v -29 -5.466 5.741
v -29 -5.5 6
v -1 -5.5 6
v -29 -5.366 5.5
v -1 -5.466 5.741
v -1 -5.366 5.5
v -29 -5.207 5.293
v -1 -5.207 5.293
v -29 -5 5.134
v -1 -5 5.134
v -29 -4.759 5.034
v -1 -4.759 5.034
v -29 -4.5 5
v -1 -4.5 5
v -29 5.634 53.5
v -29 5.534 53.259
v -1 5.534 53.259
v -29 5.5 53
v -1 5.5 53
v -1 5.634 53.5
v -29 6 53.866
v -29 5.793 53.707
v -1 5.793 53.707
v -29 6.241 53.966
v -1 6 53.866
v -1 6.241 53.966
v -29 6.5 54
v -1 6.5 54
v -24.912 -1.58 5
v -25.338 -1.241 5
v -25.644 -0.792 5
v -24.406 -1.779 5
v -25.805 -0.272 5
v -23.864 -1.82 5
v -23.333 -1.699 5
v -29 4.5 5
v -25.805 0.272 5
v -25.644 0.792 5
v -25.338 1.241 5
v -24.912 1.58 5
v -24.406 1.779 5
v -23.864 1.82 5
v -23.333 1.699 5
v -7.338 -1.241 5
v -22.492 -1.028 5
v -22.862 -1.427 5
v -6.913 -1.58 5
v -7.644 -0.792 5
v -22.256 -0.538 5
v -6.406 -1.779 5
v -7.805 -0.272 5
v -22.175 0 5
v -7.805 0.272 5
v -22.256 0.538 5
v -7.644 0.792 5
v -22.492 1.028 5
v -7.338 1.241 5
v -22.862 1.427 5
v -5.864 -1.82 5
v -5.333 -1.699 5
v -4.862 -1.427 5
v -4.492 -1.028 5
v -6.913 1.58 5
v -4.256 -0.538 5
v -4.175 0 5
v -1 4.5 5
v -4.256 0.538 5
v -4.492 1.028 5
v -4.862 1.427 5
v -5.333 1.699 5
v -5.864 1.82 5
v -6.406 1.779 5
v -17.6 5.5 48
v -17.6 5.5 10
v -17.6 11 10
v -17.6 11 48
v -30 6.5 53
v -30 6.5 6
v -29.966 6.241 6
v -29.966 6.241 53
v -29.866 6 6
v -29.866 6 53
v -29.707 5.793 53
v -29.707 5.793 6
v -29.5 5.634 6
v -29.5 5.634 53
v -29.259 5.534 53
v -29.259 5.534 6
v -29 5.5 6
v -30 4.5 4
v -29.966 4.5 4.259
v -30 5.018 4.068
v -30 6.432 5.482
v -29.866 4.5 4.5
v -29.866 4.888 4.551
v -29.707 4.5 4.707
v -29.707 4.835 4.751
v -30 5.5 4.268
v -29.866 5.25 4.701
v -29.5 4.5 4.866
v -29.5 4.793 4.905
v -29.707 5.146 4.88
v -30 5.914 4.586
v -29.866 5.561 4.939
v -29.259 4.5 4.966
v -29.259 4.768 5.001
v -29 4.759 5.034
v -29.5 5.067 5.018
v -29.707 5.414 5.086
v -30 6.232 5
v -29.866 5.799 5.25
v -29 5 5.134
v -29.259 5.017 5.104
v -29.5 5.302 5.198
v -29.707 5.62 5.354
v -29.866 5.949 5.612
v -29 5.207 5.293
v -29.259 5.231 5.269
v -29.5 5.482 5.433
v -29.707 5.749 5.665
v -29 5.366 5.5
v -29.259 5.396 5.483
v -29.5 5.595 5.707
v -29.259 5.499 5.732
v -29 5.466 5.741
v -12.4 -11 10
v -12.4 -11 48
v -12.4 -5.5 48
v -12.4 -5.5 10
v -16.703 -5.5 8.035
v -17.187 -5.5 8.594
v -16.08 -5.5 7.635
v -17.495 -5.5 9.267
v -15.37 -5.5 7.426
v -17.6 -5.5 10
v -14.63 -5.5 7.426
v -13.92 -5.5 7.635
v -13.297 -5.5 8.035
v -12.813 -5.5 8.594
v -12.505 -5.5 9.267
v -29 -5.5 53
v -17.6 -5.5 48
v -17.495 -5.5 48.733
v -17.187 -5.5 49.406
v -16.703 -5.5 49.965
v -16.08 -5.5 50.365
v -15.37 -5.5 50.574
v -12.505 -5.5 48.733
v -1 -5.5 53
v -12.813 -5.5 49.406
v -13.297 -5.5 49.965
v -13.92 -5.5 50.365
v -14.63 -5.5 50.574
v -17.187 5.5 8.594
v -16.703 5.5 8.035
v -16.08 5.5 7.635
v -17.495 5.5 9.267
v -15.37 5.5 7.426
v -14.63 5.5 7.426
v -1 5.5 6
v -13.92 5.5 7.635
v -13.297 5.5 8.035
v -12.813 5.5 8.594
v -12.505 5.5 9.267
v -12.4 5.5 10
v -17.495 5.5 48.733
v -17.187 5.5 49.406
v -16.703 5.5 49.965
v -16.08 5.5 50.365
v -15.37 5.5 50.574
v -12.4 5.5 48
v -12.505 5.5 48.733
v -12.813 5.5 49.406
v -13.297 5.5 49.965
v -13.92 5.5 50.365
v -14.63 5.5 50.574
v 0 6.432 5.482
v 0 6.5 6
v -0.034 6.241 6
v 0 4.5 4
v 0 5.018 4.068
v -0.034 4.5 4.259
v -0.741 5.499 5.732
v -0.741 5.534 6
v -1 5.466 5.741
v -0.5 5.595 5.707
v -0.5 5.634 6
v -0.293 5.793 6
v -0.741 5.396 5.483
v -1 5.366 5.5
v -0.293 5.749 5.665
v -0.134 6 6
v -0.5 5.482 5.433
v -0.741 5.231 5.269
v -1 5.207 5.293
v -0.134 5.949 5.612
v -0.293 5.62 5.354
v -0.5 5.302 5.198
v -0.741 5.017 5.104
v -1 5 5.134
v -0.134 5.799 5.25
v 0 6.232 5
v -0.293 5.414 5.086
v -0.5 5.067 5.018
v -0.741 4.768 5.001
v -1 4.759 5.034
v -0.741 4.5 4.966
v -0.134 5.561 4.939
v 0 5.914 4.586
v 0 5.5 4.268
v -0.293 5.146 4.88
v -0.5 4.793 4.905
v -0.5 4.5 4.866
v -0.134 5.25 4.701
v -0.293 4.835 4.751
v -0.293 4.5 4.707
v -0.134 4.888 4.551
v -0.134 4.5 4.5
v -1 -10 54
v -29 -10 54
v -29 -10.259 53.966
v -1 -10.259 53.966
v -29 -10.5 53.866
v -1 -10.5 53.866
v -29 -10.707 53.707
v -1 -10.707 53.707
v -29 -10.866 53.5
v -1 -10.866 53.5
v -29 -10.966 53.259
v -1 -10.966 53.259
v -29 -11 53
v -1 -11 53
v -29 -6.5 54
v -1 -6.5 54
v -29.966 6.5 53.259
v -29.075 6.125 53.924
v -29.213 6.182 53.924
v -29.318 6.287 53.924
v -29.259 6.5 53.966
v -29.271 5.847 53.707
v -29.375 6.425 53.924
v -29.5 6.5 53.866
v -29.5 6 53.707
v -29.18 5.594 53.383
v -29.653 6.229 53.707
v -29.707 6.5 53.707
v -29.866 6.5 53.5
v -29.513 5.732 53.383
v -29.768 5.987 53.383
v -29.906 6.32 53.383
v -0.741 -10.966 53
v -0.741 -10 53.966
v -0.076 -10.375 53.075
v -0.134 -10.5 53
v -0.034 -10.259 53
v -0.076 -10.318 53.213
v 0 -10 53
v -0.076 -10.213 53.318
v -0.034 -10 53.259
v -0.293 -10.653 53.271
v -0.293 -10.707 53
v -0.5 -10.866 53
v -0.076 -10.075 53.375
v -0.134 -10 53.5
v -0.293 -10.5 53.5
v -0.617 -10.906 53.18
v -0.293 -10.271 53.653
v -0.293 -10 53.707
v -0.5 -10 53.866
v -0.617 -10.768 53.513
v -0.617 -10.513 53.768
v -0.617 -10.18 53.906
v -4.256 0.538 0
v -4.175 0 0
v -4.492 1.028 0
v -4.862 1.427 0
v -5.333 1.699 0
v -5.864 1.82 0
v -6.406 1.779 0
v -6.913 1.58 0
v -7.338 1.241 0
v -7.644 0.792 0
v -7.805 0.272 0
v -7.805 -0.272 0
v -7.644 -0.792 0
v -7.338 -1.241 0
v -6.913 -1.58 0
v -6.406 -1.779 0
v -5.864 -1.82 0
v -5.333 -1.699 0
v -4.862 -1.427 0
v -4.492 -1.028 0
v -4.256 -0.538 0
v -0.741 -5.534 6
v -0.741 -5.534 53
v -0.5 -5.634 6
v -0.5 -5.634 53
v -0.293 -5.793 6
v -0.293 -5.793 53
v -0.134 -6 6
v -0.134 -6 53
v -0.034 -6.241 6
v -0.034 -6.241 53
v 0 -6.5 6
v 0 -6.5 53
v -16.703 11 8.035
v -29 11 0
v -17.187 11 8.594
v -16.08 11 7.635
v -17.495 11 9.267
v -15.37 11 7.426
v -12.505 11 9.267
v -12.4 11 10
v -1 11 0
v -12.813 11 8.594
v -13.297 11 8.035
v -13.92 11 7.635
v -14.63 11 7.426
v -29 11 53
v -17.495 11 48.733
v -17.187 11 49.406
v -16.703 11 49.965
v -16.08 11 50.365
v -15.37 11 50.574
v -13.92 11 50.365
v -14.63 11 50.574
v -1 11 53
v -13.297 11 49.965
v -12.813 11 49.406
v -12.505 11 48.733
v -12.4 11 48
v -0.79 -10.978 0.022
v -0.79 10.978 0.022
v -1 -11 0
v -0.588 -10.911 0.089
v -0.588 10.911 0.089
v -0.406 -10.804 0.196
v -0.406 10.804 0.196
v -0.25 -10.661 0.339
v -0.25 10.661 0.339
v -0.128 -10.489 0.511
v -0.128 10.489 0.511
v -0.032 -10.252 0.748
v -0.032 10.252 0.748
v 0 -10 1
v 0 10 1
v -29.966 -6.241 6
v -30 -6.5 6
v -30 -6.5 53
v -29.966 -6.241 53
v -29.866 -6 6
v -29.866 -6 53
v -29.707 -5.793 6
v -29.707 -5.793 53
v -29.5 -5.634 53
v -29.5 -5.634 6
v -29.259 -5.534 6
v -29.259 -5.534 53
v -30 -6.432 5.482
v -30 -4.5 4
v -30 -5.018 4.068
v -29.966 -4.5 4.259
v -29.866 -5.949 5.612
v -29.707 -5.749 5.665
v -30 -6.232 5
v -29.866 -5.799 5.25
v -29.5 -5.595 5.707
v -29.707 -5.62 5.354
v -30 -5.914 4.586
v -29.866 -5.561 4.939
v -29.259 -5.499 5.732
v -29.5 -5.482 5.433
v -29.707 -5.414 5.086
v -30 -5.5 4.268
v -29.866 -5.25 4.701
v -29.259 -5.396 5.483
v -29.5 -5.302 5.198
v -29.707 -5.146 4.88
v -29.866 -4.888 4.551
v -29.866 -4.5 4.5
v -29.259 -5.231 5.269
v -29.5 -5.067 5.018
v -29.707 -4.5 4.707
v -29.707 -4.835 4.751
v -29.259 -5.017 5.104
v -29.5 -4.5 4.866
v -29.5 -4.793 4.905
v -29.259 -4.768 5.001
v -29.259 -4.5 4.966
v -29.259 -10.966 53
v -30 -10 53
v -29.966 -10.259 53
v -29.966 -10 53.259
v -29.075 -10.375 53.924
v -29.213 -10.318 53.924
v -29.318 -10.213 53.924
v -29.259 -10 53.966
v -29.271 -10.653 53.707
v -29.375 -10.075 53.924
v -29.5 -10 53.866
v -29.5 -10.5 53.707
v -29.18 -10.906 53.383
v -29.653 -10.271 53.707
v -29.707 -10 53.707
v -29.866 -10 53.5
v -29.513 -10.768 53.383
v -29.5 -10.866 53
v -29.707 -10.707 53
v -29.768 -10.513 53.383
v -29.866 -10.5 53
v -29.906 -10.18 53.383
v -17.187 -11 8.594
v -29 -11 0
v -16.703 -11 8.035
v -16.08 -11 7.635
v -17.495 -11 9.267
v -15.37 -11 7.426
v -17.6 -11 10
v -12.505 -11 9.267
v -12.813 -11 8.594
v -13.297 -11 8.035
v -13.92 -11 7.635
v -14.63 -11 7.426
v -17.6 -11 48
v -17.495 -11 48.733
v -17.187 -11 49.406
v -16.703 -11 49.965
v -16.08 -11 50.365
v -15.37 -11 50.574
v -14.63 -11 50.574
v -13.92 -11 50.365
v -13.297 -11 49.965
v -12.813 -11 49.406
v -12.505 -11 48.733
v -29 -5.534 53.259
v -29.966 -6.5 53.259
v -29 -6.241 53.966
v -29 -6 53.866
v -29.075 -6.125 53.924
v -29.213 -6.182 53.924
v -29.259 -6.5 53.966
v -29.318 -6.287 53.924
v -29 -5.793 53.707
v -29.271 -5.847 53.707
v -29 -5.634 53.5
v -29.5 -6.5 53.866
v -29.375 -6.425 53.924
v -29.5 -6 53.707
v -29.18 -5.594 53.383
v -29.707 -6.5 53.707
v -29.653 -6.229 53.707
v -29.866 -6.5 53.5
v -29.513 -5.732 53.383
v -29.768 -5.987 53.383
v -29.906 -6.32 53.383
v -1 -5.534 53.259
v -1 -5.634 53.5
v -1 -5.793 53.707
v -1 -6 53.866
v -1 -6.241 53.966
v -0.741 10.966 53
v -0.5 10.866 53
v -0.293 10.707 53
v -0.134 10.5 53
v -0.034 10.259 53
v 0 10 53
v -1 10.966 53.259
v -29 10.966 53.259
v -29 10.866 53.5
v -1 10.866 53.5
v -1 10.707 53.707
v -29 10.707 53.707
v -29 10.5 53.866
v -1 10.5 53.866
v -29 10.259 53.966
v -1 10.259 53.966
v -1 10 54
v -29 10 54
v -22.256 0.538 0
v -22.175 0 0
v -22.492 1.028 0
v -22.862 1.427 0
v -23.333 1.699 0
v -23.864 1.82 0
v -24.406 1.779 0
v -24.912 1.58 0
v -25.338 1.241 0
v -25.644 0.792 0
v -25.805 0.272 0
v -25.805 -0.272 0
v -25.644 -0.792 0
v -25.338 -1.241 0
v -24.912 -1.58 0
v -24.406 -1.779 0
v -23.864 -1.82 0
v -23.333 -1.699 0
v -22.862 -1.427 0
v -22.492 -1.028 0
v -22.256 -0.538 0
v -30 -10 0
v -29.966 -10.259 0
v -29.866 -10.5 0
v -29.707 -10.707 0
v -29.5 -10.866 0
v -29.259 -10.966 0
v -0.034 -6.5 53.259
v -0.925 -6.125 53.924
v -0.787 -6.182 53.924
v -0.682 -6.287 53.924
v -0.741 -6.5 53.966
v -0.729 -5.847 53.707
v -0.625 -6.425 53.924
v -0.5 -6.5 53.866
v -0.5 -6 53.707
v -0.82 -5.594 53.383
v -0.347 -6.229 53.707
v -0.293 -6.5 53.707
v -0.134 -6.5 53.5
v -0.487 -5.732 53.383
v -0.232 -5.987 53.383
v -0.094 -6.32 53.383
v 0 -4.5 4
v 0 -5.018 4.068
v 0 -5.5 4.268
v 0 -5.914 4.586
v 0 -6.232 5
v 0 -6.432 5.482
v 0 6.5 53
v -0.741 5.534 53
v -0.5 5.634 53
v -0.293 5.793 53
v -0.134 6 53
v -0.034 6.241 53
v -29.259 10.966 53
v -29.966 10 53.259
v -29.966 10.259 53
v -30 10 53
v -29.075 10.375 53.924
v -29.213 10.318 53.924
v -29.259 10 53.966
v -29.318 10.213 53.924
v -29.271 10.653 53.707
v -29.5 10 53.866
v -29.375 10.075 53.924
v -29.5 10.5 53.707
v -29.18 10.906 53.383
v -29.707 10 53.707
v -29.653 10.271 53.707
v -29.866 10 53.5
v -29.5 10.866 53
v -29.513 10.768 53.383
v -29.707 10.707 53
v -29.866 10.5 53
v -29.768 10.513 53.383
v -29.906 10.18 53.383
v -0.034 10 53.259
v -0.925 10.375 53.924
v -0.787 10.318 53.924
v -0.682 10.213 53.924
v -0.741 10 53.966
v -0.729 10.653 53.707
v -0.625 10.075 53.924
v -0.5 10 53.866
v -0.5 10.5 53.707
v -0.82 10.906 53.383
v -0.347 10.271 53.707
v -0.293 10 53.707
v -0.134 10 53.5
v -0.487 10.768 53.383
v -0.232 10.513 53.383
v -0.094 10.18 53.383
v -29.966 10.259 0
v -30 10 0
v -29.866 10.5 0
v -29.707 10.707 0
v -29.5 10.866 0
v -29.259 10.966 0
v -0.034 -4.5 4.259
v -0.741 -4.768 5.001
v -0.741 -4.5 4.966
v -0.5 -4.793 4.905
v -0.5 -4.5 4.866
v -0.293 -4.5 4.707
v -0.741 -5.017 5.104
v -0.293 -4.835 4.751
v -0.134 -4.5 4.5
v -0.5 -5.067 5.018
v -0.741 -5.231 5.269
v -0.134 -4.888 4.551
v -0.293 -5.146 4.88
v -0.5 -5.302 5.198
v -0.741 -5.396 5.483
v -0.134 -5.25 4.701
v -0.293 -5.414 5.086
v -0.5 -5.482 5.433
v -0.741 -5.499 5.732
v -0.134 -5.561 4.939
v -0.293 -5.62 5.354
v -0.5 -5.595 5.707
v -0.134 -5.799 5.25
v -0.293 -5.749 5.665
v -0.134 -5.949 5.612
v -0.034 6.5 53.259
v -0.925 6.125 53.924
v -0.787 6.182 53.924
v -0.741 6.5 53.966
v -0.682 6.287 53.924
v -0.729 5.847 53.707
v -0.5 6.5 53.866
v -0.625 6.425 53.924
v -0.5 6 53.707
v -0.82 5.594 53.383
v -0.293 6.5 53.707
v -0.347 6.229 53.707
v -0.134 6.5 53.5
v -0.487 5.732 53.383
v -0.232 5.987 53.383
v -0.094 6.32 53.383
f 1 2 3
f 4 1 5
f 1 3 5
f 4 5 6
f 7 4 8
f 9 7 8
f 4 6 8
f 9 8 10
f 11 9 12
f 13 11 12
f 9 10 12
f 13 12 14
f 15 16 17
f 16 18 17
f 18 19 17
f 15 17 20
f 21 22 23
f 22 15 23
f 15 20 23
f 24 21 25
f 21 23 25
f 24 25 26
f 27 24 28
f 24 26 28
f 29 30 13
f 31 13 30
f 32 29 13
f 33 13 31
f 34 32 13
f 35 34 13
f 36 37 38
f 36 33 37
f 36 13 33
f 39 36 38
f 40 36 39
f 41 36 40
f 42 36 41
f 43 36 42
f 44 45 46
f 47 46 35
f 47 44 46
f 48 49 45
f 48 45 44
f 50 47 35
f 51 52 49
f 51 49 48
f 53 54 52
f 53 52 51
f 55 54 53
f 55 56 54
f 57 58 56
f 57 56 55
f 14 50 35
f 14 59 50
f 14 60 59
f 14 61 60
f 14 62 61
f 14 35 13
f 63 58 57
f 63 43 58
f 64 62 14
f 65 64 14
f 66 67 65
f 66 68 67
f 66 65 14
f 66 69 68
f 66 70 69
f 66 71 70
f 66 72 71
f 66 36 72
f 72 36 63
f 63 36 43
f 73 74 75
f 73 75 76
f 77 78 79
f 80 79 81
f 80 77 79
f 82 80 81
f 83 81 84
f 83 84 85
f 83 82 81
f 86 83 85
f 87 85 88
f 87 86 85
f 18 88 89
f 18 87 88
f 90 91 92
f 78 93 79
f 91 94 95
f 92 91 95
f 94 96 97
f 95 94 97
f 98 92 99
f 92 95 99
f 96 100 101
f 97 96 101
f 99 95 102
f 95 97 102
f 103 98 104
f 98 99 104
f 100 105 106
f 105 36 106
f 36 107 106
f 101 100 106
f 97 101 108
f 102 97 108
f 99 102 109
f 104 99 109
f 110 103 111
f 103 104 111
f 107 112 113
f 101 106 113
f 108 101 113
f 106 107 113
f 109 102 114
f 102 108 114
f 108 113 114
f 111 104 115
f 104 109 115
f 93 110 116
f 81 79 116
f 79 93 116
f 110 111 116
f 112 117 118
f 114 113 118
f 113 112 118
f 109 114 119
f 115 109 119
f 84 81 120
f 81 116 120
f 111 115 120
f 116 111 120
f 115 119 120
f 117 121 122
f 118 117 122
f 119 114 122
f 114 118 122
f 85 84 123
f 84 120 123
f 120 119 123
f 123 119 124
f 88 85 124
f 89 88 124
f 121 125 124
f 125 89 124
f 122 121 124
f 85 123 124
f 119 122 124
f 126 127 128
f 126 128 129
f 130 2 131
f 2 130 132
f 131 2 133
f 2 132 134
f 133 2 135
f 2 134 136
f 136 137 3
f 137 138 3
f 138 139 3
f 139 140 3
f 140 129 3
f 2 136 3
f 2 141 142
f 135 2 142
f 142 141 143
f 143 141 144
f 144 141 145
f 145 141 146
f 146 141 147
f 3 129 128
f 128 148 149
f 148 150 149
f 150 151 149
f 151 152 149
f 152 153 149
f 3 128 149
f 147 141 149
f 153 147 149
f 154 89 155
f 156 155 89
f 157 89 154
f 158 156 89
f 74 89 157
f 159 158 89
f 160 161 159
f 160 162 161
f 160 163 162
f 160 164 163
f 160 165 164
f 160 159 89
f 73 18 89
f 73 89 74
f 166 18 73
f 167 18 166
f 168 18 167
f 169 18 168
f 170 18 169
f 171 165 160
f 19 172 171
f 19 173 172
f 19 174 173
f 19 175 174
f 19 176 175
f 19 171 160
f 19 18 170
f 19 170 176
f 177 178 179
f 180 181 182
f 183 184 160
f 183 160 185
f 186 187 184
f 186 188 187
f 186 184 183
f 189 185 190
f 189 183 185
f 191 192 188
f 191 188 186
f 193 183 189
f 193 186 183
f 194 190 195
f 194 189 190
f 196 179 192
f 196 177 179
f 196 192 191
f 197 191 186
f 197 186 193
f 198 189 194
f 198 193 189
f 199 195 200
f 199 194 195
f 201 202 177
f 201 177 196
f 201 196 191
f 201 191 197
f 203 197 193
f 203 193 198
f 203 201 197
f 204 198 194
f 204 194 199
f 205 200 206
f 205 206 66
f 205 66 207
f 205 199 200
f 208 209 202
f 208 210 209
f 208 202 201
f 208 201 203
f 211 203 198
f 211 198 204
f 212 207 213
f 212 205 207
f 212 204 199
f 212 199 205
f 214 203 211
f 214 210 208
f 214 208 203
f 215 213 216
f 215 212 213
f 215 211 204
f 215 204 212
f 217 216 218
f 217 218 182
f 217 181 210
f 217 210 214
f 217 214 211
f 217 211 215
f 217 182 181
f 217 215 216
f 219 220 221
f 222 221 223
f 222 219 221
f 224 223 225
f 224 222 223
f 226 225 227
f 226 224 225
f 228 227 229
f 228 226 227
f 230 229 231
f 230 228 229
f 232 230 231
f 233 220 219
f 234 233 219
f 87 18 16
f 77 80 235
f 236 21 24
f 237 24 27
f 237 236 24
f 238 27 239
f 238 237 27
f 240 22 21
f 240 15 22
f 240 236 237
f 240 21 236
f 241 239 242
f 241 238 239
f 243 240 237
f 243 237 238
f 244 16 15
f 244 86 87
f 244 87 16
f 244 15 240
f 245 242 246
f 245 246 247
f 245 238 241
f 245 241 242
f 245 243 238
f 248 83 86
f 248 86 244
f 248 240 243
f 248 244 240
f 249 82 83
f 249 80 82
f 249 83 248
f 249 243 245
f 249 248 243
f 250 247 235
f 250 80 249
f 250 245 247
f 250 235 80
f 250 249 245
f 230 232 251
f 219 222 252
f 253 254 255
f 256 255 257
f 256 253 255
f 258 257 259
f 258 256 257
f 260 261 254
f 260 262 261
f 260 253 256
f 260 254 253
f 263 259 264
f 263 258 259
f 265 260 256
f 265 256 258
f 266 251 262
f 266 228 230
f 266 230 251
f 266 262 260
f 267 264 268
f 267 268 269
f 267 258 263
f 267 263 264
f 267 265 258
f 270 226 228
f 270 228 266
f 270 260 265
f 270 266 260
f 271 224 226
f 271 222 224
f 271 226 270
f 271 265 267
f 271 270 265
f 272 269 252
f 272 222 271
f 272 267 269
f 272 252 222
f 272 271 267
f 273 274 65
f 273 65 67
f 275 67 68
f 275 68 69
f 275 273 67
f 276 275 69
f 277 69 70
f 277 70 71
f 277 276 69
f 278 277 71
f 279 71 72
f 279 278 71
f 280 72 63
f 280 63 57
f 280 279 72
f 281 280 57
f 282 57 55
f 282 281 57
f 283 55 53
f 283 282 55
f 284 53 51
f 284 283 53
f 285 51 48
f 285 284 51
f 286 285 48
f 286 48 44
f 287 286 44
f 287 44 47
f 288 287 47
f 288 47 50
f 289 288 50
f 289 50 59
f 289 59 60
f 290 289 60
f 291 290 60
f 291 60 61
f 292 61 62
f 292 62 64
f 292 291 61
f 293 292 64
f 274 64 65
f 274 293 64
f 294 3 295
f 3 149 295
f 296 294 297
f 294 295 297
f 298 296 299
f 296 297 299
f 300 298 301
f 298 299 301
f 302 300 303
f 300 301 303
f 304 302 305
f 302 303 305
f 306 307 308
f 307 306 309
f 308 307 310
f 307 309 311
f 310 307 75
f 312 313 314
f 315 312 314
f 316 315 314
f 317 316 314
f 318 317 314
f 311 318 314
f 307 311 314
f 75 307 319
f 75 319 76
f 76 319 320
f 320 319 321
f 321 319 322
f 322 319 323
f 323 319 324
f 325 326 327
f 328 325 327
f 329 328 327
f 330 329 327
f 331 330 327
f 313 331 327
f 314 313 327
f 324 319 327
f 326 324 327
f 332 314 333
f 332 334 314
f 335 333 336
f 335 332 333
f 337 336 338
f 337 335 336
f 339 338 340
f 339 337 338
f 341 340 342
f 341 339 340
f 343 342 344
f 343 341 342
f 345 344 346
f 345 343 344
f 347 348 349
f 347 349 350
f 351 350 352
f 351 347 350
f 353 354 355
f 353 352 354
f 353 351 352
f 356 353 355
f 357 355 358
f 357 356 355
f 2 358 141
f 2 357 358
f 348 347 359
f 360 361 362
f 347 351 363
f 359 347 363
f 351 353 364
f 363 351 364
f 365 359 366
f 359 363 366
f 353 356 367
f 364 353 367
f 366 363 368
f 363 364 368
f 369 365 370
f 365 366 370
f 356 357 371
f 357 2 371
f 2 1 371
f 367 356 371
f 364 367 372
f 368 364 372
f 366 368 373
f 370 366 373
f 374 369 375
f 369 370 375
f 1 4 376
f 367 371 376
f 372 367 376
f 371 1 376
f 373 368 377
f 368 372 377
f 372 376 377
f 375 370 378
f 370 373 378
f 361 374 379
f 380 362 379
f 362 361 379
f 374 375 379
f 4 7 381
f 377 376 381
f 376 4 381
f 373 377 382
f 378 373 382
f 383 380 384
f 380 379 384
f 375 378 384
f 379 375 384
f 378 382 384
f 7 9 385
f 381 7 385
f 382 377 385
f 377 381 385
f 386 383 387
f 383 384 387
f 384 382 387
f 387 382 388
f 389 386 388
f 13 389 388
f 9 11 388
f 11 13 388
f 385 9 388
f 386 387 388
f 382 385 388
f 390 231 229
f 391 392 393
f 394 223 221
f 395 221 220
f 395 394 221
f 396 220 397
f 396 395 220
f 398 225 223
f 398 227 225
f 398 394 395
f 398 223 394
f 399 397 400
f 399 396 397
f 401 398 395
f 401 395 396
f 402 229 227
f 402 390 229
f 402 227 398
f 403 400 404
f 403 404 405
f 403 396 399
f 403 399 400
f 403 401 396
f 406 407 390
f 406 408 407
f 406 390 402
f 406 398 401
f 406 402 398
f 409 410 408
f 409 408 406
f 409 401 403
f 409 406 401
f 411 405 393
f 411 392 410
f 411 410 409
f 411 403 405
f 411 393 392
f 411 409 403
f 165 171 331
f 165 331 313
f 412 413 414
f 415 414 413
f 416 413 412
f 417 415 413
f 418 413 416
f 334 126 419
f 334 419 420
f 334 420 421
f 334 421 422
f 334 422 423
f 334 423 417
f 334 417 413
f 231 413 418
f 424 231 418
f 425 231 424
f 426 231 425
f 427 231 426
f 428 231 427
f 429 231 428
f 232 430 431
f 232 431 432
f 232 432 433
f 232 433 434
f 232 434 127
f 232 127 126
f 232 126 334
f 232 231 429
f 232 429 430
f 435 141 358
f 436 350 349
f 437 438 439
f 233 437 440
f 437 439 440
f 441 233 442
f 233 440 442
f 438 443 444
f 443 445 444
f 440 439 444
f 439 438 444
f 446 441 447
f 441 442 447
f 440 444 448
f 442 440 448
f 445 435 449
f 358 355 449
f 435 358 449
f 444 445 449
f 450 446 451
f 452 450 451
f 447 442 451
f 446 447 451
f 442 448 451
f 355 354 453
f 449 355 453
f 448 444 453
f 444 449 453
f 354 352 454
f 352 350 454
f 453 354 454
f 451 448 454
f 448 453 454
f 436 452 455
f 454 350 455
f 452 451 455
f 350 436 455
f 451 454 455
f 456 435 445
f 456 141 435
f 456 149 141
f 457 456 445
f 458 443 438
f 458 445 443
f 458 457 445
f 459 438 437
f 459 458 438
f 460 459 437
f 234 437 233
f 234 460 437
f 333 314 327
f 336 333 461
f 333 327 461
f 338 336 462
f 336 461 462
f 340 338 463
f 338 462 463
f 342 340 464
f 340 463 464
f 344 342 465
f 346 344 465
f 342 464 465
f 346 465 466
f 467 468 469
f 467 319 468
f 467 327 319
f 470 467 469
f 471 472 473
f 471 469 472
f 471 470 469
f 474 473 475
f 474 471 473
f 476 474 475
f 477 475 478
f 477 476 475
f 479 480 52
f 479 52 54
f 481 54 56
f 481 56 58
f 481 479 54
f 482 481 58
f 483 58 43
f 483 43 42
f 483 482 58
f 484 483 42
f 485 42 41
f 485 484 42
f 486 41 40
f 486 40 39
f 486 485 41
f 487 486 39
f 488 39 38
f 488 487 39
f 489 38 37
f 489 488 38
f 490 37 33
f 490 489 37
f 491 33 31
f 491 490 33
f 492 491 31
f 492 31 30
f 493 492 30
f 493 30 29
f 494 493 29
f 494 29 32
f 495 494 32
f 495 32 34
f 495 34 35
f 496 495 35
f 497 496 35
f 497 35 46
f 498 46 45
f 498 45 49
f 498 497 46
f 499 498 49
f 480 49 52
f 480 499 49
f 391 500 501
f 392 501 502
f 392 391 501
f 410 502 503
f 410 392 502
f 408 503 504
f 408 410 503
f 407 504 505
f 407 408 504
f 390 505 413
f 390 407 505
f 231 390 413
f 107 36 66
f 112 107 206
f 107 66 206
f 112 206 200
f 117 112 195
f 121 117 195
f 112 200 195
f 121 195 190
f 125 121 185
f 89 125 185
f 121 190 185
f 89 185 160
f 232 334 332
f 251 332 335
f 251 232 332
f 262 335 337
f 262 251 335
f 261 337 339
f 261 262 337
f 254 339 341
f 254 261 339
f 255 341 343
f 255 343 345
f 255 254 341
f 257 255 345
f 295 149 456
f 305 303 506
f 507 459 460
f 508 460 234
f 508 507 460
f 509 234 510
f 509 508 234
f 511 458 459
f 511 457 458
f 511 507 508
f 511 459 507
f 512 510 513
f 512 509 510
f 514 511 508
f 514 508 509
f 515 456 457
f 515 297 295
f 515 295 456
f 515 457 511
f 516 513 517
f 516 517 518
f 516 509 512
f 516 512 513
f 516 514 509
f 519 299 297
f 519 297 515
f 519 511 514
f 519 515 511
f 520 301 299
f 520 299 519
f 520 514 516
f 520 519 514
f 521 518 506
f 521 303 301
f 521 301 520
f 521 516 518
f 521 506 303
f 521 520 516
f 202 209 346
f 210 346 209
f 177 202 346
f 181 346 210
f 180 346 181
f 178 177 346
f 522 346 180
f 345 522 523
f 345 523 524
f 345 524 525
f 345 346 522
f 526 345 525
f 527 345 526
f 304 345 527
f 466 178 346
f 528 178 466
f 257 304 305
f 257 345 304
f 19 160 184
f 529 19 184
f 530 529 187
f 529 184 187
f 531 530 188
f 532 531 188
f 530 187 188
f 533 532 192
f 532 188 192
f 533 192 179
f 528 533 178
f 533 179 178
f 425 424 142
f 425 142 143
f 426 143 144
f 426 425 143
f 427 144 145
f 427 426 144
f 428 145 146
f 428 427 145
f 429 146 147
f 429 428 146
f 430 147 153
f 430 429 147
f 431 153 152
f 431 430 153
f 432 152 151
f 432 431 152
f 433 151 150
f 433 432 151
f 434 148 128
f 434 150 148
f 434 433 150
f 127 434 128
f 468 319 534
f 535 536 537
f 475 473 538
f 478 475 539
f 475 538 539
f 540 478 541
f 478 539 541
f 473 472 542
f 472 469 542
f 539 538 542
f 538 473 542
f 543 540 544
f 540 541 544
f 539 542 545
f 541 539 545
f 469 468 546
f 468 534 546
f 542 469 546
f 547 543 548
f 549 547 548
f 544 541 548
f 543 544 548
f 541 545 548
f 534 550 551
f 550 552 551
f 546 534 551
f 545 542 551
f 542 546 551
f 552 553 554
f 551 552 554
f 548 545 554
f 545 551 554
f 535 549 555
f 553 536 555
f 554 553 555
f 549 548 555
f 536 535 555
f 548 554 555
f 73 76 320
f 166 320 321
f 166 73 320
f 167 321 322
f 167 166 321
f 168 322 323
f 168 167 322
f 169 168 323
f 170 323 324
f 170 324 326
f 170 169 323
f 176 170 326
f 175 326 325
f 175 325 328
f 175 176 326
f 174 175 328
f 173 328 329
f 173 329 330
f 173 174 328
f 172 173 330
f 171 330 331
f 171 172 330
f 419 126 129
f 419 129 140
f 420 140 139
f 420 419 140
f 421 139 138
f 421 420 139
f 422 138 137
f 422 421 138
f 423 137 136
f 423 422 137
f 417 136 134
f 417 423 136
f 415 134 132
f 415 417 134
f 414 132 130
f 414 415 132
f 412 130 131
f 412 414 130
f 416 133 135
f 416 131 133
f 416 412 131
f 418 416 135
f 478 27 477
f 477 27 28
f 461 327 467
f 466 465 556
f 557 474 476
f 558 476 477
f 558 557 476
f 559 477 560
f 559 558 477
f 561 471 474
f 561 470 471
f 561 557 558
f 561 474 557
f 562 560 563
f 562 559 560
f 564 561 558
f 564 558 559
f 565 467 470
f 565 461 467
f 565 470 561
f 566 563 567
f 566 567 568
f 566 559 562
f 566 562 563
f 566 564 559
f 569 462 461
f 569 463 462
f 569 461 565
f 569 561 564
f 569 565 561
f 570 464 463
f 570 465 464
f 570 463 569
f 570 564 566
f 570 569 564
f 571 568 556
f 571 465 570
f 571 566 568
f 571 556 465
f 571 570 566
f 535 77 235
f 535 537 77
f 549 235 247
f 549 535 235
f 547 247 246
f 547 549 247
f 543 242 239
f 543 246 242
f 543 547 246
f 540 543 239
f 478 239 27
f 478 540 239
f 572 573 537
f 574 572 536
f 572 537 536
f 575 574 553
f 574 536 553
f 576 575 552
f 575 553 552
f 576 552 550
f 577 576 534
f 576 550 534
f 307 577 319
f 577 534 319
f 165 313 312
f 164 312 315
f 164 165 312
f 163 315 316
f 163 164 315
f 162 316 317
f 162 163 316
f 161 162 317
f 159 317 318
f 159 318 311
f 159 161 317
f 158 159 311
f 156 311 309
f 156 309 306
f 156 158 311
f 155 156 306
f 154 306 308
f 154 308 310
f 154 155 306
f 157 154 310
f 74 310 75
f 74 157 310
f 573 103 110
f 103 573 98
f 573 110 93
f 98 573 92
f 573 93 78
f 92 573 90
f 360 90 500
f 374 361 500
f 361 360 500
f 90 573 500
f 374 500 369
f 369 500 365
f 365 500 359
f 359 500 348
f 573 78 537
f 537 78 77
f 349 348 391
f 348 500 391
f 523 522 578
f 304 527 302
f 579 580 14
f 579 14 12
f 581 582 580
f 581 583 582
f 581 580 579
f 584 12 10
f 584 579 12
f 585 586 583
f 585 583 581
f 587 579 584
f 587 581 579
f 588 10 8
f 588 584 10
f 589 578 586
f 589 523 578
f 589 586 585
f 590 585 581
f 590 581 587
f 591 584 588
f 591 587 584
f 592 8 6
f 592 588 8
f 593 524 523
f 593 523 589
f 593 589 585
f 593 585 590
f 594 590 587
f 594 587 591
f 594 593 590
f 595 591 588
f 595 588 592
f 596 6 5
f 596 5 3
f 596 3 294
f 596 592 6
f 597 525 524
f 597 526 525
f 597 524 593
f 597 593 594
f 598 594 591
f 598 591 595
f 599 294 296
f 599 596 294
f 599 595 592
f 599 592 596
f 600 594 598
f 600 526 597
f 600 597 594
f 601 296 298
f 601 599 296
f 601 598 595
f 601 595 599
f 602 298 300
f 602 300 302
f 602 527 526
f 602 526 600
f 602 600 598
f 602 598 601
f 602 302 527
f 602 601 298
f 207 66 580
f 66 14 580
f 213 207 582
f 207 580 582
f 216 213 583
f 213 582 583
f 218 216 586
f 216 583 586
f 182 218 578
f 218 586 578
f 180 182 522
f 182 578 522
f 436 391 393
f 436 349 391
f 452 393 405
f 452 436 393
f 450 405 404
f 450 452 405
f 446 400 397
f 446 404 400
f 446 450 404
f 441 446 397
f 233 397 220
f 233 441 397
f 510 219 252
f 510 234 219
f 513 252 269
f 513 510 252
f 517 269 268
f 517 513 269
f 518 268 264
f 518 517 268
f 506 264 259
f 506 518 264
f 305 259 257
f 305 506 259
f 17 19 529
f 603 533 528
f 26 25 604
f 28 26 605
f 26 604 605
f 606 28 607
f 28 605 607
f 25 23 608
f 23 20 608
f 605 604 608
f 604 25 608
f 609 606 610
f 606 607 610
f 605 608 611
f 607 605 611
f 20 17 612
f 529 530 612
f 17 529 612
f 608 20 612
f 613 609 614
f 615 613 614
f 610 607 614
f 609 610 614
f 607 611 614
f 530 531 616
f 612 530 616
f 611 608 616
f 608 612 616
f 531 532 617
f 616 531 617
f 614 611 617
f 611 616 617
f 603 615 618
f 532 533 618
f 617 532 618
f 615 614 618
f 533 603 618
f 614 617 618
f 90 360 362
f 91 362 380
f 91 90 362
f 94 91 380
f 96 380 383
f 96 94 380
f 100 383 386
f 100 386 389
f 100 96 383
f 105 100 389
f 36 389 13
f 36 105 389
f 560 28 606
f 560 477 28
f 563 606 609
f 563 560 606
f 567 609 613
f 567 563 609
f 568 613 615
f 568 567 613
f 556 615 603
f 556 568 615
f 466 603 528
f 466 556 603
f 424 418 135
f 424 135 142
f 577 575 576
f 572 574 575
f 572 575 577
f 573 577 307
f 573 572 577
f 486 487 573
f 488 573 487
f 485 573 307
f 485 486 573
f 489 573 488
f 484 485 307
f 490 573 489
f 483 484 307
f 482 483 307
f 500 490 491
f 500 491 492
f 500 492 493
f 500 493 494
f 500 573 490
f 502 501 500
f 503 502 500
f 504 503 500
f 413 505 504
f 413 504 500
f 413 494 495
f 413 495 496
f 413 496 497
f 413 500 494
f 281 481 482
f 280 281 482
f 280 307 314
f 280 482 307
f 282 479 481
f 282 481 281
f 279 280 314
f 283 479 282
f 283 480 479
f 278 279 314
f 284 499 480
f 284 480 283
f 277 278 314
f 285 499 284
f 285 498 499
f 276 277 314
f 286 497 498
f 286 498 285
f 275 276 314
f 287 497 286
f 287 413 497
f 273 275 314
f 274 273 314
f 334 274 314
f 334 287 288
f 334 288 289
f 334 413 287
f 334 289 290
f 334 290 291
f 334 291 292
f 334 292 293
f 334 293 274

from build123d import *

# Parameters (mm, degrees)
F0_W     = 30
F0_H     = 54
F1_DEPTH = 11
F2_W     = 30
F2_H     = 11
F3_DEPTH = 49
F4_R     = 1.825
F5_DEPTH = 5
F6_F1_R  = 1
F6_F2_R  = 1


with BuildPart() as f1:
    # F0 (on Front) → F1 (new body, symmetric)
    with BuildSketch(Plane.XZ):
        with Locations((-15, 27)):
            Rectangle(F0_W, F0_H)
        with BuildLine():
            Line((-17.6, 10), (-17.6, 48))
            ThreePointArc((-17.6, 48), (-15, 50.6), (-12.4, 48))
            Line((-12.4, 48), (-12.4, 10))
            ThreePointArc((-12.4, 10), (-15, 7.4), (-17.6, 10))
        make_face(mode=Mode.SUBTRACT)
    extrude(amount=F1_DEPTH, both=True)

    # F2 (on face) → F3 (cut, through all)
    with BuildSketch(Plane.XY.offset(54)):
        with Locations((-15, 0)):
            Rectangle(F2_W, F2_H)
    extrude(amount=-F3_DEPTH, mode=Mode.SUBTRACT)

    # F4 (on Top) → F5 (cut, through all)
    with BuildSketch(Plane.XY):
        with Locations((-24, 0)):
            Circle(F4_R)
        with Locations((-6, 0)):
            Circle(F4_R)
    extrude(amount=F5_DEPTH, mode=Mode.SUBTRACT)

    # F6: fillet of radius 1 on 19 edges, made by hand

    # F6_f1
    f6_f1_edges = [f1.edges().sort_by_distance(p)[0] for p in [
        (-15, -5.5, 5),
        (-15, 5.5, 5),
    ]]
    fillet(f6_f1_edges, radius=F6_F1_R)

    # F6_f2
    f6_f2_edges = [f1.edges().sort_by_distance(p)[0] for p in [
        (-30, -11, 27),
        (-30, -5.5, 30),
        (-30, 5.5, 30),
        (0, 5.5, 30),
        (0, 11, 27),
        (-30, 11, 27),
        (-15, 11, 54),
        (-15, 5.5, 54),
        (-15, -11, 54),
        (-15, -5.5, 54),
        (0, -5.5, 30),
        (0, -11, 27),
        (0, -8.25, 54),
        (0, 8.25, 54),
        (0, 0, 0),
        (-30, -8.25, 54),
        (-30, 8.25, 54),
        (0, -5.2071067812, 5.2928932188),
        (0, 5.2071067812, 5.2928932188),
        (-30, 5.2071067812, 5.2928932188),
        (-30, -5.2071067812, 5.2928932188),
    ]]
    fillet(f6_f2_edges, radius=F6_F2_R)


solid = f1.part
